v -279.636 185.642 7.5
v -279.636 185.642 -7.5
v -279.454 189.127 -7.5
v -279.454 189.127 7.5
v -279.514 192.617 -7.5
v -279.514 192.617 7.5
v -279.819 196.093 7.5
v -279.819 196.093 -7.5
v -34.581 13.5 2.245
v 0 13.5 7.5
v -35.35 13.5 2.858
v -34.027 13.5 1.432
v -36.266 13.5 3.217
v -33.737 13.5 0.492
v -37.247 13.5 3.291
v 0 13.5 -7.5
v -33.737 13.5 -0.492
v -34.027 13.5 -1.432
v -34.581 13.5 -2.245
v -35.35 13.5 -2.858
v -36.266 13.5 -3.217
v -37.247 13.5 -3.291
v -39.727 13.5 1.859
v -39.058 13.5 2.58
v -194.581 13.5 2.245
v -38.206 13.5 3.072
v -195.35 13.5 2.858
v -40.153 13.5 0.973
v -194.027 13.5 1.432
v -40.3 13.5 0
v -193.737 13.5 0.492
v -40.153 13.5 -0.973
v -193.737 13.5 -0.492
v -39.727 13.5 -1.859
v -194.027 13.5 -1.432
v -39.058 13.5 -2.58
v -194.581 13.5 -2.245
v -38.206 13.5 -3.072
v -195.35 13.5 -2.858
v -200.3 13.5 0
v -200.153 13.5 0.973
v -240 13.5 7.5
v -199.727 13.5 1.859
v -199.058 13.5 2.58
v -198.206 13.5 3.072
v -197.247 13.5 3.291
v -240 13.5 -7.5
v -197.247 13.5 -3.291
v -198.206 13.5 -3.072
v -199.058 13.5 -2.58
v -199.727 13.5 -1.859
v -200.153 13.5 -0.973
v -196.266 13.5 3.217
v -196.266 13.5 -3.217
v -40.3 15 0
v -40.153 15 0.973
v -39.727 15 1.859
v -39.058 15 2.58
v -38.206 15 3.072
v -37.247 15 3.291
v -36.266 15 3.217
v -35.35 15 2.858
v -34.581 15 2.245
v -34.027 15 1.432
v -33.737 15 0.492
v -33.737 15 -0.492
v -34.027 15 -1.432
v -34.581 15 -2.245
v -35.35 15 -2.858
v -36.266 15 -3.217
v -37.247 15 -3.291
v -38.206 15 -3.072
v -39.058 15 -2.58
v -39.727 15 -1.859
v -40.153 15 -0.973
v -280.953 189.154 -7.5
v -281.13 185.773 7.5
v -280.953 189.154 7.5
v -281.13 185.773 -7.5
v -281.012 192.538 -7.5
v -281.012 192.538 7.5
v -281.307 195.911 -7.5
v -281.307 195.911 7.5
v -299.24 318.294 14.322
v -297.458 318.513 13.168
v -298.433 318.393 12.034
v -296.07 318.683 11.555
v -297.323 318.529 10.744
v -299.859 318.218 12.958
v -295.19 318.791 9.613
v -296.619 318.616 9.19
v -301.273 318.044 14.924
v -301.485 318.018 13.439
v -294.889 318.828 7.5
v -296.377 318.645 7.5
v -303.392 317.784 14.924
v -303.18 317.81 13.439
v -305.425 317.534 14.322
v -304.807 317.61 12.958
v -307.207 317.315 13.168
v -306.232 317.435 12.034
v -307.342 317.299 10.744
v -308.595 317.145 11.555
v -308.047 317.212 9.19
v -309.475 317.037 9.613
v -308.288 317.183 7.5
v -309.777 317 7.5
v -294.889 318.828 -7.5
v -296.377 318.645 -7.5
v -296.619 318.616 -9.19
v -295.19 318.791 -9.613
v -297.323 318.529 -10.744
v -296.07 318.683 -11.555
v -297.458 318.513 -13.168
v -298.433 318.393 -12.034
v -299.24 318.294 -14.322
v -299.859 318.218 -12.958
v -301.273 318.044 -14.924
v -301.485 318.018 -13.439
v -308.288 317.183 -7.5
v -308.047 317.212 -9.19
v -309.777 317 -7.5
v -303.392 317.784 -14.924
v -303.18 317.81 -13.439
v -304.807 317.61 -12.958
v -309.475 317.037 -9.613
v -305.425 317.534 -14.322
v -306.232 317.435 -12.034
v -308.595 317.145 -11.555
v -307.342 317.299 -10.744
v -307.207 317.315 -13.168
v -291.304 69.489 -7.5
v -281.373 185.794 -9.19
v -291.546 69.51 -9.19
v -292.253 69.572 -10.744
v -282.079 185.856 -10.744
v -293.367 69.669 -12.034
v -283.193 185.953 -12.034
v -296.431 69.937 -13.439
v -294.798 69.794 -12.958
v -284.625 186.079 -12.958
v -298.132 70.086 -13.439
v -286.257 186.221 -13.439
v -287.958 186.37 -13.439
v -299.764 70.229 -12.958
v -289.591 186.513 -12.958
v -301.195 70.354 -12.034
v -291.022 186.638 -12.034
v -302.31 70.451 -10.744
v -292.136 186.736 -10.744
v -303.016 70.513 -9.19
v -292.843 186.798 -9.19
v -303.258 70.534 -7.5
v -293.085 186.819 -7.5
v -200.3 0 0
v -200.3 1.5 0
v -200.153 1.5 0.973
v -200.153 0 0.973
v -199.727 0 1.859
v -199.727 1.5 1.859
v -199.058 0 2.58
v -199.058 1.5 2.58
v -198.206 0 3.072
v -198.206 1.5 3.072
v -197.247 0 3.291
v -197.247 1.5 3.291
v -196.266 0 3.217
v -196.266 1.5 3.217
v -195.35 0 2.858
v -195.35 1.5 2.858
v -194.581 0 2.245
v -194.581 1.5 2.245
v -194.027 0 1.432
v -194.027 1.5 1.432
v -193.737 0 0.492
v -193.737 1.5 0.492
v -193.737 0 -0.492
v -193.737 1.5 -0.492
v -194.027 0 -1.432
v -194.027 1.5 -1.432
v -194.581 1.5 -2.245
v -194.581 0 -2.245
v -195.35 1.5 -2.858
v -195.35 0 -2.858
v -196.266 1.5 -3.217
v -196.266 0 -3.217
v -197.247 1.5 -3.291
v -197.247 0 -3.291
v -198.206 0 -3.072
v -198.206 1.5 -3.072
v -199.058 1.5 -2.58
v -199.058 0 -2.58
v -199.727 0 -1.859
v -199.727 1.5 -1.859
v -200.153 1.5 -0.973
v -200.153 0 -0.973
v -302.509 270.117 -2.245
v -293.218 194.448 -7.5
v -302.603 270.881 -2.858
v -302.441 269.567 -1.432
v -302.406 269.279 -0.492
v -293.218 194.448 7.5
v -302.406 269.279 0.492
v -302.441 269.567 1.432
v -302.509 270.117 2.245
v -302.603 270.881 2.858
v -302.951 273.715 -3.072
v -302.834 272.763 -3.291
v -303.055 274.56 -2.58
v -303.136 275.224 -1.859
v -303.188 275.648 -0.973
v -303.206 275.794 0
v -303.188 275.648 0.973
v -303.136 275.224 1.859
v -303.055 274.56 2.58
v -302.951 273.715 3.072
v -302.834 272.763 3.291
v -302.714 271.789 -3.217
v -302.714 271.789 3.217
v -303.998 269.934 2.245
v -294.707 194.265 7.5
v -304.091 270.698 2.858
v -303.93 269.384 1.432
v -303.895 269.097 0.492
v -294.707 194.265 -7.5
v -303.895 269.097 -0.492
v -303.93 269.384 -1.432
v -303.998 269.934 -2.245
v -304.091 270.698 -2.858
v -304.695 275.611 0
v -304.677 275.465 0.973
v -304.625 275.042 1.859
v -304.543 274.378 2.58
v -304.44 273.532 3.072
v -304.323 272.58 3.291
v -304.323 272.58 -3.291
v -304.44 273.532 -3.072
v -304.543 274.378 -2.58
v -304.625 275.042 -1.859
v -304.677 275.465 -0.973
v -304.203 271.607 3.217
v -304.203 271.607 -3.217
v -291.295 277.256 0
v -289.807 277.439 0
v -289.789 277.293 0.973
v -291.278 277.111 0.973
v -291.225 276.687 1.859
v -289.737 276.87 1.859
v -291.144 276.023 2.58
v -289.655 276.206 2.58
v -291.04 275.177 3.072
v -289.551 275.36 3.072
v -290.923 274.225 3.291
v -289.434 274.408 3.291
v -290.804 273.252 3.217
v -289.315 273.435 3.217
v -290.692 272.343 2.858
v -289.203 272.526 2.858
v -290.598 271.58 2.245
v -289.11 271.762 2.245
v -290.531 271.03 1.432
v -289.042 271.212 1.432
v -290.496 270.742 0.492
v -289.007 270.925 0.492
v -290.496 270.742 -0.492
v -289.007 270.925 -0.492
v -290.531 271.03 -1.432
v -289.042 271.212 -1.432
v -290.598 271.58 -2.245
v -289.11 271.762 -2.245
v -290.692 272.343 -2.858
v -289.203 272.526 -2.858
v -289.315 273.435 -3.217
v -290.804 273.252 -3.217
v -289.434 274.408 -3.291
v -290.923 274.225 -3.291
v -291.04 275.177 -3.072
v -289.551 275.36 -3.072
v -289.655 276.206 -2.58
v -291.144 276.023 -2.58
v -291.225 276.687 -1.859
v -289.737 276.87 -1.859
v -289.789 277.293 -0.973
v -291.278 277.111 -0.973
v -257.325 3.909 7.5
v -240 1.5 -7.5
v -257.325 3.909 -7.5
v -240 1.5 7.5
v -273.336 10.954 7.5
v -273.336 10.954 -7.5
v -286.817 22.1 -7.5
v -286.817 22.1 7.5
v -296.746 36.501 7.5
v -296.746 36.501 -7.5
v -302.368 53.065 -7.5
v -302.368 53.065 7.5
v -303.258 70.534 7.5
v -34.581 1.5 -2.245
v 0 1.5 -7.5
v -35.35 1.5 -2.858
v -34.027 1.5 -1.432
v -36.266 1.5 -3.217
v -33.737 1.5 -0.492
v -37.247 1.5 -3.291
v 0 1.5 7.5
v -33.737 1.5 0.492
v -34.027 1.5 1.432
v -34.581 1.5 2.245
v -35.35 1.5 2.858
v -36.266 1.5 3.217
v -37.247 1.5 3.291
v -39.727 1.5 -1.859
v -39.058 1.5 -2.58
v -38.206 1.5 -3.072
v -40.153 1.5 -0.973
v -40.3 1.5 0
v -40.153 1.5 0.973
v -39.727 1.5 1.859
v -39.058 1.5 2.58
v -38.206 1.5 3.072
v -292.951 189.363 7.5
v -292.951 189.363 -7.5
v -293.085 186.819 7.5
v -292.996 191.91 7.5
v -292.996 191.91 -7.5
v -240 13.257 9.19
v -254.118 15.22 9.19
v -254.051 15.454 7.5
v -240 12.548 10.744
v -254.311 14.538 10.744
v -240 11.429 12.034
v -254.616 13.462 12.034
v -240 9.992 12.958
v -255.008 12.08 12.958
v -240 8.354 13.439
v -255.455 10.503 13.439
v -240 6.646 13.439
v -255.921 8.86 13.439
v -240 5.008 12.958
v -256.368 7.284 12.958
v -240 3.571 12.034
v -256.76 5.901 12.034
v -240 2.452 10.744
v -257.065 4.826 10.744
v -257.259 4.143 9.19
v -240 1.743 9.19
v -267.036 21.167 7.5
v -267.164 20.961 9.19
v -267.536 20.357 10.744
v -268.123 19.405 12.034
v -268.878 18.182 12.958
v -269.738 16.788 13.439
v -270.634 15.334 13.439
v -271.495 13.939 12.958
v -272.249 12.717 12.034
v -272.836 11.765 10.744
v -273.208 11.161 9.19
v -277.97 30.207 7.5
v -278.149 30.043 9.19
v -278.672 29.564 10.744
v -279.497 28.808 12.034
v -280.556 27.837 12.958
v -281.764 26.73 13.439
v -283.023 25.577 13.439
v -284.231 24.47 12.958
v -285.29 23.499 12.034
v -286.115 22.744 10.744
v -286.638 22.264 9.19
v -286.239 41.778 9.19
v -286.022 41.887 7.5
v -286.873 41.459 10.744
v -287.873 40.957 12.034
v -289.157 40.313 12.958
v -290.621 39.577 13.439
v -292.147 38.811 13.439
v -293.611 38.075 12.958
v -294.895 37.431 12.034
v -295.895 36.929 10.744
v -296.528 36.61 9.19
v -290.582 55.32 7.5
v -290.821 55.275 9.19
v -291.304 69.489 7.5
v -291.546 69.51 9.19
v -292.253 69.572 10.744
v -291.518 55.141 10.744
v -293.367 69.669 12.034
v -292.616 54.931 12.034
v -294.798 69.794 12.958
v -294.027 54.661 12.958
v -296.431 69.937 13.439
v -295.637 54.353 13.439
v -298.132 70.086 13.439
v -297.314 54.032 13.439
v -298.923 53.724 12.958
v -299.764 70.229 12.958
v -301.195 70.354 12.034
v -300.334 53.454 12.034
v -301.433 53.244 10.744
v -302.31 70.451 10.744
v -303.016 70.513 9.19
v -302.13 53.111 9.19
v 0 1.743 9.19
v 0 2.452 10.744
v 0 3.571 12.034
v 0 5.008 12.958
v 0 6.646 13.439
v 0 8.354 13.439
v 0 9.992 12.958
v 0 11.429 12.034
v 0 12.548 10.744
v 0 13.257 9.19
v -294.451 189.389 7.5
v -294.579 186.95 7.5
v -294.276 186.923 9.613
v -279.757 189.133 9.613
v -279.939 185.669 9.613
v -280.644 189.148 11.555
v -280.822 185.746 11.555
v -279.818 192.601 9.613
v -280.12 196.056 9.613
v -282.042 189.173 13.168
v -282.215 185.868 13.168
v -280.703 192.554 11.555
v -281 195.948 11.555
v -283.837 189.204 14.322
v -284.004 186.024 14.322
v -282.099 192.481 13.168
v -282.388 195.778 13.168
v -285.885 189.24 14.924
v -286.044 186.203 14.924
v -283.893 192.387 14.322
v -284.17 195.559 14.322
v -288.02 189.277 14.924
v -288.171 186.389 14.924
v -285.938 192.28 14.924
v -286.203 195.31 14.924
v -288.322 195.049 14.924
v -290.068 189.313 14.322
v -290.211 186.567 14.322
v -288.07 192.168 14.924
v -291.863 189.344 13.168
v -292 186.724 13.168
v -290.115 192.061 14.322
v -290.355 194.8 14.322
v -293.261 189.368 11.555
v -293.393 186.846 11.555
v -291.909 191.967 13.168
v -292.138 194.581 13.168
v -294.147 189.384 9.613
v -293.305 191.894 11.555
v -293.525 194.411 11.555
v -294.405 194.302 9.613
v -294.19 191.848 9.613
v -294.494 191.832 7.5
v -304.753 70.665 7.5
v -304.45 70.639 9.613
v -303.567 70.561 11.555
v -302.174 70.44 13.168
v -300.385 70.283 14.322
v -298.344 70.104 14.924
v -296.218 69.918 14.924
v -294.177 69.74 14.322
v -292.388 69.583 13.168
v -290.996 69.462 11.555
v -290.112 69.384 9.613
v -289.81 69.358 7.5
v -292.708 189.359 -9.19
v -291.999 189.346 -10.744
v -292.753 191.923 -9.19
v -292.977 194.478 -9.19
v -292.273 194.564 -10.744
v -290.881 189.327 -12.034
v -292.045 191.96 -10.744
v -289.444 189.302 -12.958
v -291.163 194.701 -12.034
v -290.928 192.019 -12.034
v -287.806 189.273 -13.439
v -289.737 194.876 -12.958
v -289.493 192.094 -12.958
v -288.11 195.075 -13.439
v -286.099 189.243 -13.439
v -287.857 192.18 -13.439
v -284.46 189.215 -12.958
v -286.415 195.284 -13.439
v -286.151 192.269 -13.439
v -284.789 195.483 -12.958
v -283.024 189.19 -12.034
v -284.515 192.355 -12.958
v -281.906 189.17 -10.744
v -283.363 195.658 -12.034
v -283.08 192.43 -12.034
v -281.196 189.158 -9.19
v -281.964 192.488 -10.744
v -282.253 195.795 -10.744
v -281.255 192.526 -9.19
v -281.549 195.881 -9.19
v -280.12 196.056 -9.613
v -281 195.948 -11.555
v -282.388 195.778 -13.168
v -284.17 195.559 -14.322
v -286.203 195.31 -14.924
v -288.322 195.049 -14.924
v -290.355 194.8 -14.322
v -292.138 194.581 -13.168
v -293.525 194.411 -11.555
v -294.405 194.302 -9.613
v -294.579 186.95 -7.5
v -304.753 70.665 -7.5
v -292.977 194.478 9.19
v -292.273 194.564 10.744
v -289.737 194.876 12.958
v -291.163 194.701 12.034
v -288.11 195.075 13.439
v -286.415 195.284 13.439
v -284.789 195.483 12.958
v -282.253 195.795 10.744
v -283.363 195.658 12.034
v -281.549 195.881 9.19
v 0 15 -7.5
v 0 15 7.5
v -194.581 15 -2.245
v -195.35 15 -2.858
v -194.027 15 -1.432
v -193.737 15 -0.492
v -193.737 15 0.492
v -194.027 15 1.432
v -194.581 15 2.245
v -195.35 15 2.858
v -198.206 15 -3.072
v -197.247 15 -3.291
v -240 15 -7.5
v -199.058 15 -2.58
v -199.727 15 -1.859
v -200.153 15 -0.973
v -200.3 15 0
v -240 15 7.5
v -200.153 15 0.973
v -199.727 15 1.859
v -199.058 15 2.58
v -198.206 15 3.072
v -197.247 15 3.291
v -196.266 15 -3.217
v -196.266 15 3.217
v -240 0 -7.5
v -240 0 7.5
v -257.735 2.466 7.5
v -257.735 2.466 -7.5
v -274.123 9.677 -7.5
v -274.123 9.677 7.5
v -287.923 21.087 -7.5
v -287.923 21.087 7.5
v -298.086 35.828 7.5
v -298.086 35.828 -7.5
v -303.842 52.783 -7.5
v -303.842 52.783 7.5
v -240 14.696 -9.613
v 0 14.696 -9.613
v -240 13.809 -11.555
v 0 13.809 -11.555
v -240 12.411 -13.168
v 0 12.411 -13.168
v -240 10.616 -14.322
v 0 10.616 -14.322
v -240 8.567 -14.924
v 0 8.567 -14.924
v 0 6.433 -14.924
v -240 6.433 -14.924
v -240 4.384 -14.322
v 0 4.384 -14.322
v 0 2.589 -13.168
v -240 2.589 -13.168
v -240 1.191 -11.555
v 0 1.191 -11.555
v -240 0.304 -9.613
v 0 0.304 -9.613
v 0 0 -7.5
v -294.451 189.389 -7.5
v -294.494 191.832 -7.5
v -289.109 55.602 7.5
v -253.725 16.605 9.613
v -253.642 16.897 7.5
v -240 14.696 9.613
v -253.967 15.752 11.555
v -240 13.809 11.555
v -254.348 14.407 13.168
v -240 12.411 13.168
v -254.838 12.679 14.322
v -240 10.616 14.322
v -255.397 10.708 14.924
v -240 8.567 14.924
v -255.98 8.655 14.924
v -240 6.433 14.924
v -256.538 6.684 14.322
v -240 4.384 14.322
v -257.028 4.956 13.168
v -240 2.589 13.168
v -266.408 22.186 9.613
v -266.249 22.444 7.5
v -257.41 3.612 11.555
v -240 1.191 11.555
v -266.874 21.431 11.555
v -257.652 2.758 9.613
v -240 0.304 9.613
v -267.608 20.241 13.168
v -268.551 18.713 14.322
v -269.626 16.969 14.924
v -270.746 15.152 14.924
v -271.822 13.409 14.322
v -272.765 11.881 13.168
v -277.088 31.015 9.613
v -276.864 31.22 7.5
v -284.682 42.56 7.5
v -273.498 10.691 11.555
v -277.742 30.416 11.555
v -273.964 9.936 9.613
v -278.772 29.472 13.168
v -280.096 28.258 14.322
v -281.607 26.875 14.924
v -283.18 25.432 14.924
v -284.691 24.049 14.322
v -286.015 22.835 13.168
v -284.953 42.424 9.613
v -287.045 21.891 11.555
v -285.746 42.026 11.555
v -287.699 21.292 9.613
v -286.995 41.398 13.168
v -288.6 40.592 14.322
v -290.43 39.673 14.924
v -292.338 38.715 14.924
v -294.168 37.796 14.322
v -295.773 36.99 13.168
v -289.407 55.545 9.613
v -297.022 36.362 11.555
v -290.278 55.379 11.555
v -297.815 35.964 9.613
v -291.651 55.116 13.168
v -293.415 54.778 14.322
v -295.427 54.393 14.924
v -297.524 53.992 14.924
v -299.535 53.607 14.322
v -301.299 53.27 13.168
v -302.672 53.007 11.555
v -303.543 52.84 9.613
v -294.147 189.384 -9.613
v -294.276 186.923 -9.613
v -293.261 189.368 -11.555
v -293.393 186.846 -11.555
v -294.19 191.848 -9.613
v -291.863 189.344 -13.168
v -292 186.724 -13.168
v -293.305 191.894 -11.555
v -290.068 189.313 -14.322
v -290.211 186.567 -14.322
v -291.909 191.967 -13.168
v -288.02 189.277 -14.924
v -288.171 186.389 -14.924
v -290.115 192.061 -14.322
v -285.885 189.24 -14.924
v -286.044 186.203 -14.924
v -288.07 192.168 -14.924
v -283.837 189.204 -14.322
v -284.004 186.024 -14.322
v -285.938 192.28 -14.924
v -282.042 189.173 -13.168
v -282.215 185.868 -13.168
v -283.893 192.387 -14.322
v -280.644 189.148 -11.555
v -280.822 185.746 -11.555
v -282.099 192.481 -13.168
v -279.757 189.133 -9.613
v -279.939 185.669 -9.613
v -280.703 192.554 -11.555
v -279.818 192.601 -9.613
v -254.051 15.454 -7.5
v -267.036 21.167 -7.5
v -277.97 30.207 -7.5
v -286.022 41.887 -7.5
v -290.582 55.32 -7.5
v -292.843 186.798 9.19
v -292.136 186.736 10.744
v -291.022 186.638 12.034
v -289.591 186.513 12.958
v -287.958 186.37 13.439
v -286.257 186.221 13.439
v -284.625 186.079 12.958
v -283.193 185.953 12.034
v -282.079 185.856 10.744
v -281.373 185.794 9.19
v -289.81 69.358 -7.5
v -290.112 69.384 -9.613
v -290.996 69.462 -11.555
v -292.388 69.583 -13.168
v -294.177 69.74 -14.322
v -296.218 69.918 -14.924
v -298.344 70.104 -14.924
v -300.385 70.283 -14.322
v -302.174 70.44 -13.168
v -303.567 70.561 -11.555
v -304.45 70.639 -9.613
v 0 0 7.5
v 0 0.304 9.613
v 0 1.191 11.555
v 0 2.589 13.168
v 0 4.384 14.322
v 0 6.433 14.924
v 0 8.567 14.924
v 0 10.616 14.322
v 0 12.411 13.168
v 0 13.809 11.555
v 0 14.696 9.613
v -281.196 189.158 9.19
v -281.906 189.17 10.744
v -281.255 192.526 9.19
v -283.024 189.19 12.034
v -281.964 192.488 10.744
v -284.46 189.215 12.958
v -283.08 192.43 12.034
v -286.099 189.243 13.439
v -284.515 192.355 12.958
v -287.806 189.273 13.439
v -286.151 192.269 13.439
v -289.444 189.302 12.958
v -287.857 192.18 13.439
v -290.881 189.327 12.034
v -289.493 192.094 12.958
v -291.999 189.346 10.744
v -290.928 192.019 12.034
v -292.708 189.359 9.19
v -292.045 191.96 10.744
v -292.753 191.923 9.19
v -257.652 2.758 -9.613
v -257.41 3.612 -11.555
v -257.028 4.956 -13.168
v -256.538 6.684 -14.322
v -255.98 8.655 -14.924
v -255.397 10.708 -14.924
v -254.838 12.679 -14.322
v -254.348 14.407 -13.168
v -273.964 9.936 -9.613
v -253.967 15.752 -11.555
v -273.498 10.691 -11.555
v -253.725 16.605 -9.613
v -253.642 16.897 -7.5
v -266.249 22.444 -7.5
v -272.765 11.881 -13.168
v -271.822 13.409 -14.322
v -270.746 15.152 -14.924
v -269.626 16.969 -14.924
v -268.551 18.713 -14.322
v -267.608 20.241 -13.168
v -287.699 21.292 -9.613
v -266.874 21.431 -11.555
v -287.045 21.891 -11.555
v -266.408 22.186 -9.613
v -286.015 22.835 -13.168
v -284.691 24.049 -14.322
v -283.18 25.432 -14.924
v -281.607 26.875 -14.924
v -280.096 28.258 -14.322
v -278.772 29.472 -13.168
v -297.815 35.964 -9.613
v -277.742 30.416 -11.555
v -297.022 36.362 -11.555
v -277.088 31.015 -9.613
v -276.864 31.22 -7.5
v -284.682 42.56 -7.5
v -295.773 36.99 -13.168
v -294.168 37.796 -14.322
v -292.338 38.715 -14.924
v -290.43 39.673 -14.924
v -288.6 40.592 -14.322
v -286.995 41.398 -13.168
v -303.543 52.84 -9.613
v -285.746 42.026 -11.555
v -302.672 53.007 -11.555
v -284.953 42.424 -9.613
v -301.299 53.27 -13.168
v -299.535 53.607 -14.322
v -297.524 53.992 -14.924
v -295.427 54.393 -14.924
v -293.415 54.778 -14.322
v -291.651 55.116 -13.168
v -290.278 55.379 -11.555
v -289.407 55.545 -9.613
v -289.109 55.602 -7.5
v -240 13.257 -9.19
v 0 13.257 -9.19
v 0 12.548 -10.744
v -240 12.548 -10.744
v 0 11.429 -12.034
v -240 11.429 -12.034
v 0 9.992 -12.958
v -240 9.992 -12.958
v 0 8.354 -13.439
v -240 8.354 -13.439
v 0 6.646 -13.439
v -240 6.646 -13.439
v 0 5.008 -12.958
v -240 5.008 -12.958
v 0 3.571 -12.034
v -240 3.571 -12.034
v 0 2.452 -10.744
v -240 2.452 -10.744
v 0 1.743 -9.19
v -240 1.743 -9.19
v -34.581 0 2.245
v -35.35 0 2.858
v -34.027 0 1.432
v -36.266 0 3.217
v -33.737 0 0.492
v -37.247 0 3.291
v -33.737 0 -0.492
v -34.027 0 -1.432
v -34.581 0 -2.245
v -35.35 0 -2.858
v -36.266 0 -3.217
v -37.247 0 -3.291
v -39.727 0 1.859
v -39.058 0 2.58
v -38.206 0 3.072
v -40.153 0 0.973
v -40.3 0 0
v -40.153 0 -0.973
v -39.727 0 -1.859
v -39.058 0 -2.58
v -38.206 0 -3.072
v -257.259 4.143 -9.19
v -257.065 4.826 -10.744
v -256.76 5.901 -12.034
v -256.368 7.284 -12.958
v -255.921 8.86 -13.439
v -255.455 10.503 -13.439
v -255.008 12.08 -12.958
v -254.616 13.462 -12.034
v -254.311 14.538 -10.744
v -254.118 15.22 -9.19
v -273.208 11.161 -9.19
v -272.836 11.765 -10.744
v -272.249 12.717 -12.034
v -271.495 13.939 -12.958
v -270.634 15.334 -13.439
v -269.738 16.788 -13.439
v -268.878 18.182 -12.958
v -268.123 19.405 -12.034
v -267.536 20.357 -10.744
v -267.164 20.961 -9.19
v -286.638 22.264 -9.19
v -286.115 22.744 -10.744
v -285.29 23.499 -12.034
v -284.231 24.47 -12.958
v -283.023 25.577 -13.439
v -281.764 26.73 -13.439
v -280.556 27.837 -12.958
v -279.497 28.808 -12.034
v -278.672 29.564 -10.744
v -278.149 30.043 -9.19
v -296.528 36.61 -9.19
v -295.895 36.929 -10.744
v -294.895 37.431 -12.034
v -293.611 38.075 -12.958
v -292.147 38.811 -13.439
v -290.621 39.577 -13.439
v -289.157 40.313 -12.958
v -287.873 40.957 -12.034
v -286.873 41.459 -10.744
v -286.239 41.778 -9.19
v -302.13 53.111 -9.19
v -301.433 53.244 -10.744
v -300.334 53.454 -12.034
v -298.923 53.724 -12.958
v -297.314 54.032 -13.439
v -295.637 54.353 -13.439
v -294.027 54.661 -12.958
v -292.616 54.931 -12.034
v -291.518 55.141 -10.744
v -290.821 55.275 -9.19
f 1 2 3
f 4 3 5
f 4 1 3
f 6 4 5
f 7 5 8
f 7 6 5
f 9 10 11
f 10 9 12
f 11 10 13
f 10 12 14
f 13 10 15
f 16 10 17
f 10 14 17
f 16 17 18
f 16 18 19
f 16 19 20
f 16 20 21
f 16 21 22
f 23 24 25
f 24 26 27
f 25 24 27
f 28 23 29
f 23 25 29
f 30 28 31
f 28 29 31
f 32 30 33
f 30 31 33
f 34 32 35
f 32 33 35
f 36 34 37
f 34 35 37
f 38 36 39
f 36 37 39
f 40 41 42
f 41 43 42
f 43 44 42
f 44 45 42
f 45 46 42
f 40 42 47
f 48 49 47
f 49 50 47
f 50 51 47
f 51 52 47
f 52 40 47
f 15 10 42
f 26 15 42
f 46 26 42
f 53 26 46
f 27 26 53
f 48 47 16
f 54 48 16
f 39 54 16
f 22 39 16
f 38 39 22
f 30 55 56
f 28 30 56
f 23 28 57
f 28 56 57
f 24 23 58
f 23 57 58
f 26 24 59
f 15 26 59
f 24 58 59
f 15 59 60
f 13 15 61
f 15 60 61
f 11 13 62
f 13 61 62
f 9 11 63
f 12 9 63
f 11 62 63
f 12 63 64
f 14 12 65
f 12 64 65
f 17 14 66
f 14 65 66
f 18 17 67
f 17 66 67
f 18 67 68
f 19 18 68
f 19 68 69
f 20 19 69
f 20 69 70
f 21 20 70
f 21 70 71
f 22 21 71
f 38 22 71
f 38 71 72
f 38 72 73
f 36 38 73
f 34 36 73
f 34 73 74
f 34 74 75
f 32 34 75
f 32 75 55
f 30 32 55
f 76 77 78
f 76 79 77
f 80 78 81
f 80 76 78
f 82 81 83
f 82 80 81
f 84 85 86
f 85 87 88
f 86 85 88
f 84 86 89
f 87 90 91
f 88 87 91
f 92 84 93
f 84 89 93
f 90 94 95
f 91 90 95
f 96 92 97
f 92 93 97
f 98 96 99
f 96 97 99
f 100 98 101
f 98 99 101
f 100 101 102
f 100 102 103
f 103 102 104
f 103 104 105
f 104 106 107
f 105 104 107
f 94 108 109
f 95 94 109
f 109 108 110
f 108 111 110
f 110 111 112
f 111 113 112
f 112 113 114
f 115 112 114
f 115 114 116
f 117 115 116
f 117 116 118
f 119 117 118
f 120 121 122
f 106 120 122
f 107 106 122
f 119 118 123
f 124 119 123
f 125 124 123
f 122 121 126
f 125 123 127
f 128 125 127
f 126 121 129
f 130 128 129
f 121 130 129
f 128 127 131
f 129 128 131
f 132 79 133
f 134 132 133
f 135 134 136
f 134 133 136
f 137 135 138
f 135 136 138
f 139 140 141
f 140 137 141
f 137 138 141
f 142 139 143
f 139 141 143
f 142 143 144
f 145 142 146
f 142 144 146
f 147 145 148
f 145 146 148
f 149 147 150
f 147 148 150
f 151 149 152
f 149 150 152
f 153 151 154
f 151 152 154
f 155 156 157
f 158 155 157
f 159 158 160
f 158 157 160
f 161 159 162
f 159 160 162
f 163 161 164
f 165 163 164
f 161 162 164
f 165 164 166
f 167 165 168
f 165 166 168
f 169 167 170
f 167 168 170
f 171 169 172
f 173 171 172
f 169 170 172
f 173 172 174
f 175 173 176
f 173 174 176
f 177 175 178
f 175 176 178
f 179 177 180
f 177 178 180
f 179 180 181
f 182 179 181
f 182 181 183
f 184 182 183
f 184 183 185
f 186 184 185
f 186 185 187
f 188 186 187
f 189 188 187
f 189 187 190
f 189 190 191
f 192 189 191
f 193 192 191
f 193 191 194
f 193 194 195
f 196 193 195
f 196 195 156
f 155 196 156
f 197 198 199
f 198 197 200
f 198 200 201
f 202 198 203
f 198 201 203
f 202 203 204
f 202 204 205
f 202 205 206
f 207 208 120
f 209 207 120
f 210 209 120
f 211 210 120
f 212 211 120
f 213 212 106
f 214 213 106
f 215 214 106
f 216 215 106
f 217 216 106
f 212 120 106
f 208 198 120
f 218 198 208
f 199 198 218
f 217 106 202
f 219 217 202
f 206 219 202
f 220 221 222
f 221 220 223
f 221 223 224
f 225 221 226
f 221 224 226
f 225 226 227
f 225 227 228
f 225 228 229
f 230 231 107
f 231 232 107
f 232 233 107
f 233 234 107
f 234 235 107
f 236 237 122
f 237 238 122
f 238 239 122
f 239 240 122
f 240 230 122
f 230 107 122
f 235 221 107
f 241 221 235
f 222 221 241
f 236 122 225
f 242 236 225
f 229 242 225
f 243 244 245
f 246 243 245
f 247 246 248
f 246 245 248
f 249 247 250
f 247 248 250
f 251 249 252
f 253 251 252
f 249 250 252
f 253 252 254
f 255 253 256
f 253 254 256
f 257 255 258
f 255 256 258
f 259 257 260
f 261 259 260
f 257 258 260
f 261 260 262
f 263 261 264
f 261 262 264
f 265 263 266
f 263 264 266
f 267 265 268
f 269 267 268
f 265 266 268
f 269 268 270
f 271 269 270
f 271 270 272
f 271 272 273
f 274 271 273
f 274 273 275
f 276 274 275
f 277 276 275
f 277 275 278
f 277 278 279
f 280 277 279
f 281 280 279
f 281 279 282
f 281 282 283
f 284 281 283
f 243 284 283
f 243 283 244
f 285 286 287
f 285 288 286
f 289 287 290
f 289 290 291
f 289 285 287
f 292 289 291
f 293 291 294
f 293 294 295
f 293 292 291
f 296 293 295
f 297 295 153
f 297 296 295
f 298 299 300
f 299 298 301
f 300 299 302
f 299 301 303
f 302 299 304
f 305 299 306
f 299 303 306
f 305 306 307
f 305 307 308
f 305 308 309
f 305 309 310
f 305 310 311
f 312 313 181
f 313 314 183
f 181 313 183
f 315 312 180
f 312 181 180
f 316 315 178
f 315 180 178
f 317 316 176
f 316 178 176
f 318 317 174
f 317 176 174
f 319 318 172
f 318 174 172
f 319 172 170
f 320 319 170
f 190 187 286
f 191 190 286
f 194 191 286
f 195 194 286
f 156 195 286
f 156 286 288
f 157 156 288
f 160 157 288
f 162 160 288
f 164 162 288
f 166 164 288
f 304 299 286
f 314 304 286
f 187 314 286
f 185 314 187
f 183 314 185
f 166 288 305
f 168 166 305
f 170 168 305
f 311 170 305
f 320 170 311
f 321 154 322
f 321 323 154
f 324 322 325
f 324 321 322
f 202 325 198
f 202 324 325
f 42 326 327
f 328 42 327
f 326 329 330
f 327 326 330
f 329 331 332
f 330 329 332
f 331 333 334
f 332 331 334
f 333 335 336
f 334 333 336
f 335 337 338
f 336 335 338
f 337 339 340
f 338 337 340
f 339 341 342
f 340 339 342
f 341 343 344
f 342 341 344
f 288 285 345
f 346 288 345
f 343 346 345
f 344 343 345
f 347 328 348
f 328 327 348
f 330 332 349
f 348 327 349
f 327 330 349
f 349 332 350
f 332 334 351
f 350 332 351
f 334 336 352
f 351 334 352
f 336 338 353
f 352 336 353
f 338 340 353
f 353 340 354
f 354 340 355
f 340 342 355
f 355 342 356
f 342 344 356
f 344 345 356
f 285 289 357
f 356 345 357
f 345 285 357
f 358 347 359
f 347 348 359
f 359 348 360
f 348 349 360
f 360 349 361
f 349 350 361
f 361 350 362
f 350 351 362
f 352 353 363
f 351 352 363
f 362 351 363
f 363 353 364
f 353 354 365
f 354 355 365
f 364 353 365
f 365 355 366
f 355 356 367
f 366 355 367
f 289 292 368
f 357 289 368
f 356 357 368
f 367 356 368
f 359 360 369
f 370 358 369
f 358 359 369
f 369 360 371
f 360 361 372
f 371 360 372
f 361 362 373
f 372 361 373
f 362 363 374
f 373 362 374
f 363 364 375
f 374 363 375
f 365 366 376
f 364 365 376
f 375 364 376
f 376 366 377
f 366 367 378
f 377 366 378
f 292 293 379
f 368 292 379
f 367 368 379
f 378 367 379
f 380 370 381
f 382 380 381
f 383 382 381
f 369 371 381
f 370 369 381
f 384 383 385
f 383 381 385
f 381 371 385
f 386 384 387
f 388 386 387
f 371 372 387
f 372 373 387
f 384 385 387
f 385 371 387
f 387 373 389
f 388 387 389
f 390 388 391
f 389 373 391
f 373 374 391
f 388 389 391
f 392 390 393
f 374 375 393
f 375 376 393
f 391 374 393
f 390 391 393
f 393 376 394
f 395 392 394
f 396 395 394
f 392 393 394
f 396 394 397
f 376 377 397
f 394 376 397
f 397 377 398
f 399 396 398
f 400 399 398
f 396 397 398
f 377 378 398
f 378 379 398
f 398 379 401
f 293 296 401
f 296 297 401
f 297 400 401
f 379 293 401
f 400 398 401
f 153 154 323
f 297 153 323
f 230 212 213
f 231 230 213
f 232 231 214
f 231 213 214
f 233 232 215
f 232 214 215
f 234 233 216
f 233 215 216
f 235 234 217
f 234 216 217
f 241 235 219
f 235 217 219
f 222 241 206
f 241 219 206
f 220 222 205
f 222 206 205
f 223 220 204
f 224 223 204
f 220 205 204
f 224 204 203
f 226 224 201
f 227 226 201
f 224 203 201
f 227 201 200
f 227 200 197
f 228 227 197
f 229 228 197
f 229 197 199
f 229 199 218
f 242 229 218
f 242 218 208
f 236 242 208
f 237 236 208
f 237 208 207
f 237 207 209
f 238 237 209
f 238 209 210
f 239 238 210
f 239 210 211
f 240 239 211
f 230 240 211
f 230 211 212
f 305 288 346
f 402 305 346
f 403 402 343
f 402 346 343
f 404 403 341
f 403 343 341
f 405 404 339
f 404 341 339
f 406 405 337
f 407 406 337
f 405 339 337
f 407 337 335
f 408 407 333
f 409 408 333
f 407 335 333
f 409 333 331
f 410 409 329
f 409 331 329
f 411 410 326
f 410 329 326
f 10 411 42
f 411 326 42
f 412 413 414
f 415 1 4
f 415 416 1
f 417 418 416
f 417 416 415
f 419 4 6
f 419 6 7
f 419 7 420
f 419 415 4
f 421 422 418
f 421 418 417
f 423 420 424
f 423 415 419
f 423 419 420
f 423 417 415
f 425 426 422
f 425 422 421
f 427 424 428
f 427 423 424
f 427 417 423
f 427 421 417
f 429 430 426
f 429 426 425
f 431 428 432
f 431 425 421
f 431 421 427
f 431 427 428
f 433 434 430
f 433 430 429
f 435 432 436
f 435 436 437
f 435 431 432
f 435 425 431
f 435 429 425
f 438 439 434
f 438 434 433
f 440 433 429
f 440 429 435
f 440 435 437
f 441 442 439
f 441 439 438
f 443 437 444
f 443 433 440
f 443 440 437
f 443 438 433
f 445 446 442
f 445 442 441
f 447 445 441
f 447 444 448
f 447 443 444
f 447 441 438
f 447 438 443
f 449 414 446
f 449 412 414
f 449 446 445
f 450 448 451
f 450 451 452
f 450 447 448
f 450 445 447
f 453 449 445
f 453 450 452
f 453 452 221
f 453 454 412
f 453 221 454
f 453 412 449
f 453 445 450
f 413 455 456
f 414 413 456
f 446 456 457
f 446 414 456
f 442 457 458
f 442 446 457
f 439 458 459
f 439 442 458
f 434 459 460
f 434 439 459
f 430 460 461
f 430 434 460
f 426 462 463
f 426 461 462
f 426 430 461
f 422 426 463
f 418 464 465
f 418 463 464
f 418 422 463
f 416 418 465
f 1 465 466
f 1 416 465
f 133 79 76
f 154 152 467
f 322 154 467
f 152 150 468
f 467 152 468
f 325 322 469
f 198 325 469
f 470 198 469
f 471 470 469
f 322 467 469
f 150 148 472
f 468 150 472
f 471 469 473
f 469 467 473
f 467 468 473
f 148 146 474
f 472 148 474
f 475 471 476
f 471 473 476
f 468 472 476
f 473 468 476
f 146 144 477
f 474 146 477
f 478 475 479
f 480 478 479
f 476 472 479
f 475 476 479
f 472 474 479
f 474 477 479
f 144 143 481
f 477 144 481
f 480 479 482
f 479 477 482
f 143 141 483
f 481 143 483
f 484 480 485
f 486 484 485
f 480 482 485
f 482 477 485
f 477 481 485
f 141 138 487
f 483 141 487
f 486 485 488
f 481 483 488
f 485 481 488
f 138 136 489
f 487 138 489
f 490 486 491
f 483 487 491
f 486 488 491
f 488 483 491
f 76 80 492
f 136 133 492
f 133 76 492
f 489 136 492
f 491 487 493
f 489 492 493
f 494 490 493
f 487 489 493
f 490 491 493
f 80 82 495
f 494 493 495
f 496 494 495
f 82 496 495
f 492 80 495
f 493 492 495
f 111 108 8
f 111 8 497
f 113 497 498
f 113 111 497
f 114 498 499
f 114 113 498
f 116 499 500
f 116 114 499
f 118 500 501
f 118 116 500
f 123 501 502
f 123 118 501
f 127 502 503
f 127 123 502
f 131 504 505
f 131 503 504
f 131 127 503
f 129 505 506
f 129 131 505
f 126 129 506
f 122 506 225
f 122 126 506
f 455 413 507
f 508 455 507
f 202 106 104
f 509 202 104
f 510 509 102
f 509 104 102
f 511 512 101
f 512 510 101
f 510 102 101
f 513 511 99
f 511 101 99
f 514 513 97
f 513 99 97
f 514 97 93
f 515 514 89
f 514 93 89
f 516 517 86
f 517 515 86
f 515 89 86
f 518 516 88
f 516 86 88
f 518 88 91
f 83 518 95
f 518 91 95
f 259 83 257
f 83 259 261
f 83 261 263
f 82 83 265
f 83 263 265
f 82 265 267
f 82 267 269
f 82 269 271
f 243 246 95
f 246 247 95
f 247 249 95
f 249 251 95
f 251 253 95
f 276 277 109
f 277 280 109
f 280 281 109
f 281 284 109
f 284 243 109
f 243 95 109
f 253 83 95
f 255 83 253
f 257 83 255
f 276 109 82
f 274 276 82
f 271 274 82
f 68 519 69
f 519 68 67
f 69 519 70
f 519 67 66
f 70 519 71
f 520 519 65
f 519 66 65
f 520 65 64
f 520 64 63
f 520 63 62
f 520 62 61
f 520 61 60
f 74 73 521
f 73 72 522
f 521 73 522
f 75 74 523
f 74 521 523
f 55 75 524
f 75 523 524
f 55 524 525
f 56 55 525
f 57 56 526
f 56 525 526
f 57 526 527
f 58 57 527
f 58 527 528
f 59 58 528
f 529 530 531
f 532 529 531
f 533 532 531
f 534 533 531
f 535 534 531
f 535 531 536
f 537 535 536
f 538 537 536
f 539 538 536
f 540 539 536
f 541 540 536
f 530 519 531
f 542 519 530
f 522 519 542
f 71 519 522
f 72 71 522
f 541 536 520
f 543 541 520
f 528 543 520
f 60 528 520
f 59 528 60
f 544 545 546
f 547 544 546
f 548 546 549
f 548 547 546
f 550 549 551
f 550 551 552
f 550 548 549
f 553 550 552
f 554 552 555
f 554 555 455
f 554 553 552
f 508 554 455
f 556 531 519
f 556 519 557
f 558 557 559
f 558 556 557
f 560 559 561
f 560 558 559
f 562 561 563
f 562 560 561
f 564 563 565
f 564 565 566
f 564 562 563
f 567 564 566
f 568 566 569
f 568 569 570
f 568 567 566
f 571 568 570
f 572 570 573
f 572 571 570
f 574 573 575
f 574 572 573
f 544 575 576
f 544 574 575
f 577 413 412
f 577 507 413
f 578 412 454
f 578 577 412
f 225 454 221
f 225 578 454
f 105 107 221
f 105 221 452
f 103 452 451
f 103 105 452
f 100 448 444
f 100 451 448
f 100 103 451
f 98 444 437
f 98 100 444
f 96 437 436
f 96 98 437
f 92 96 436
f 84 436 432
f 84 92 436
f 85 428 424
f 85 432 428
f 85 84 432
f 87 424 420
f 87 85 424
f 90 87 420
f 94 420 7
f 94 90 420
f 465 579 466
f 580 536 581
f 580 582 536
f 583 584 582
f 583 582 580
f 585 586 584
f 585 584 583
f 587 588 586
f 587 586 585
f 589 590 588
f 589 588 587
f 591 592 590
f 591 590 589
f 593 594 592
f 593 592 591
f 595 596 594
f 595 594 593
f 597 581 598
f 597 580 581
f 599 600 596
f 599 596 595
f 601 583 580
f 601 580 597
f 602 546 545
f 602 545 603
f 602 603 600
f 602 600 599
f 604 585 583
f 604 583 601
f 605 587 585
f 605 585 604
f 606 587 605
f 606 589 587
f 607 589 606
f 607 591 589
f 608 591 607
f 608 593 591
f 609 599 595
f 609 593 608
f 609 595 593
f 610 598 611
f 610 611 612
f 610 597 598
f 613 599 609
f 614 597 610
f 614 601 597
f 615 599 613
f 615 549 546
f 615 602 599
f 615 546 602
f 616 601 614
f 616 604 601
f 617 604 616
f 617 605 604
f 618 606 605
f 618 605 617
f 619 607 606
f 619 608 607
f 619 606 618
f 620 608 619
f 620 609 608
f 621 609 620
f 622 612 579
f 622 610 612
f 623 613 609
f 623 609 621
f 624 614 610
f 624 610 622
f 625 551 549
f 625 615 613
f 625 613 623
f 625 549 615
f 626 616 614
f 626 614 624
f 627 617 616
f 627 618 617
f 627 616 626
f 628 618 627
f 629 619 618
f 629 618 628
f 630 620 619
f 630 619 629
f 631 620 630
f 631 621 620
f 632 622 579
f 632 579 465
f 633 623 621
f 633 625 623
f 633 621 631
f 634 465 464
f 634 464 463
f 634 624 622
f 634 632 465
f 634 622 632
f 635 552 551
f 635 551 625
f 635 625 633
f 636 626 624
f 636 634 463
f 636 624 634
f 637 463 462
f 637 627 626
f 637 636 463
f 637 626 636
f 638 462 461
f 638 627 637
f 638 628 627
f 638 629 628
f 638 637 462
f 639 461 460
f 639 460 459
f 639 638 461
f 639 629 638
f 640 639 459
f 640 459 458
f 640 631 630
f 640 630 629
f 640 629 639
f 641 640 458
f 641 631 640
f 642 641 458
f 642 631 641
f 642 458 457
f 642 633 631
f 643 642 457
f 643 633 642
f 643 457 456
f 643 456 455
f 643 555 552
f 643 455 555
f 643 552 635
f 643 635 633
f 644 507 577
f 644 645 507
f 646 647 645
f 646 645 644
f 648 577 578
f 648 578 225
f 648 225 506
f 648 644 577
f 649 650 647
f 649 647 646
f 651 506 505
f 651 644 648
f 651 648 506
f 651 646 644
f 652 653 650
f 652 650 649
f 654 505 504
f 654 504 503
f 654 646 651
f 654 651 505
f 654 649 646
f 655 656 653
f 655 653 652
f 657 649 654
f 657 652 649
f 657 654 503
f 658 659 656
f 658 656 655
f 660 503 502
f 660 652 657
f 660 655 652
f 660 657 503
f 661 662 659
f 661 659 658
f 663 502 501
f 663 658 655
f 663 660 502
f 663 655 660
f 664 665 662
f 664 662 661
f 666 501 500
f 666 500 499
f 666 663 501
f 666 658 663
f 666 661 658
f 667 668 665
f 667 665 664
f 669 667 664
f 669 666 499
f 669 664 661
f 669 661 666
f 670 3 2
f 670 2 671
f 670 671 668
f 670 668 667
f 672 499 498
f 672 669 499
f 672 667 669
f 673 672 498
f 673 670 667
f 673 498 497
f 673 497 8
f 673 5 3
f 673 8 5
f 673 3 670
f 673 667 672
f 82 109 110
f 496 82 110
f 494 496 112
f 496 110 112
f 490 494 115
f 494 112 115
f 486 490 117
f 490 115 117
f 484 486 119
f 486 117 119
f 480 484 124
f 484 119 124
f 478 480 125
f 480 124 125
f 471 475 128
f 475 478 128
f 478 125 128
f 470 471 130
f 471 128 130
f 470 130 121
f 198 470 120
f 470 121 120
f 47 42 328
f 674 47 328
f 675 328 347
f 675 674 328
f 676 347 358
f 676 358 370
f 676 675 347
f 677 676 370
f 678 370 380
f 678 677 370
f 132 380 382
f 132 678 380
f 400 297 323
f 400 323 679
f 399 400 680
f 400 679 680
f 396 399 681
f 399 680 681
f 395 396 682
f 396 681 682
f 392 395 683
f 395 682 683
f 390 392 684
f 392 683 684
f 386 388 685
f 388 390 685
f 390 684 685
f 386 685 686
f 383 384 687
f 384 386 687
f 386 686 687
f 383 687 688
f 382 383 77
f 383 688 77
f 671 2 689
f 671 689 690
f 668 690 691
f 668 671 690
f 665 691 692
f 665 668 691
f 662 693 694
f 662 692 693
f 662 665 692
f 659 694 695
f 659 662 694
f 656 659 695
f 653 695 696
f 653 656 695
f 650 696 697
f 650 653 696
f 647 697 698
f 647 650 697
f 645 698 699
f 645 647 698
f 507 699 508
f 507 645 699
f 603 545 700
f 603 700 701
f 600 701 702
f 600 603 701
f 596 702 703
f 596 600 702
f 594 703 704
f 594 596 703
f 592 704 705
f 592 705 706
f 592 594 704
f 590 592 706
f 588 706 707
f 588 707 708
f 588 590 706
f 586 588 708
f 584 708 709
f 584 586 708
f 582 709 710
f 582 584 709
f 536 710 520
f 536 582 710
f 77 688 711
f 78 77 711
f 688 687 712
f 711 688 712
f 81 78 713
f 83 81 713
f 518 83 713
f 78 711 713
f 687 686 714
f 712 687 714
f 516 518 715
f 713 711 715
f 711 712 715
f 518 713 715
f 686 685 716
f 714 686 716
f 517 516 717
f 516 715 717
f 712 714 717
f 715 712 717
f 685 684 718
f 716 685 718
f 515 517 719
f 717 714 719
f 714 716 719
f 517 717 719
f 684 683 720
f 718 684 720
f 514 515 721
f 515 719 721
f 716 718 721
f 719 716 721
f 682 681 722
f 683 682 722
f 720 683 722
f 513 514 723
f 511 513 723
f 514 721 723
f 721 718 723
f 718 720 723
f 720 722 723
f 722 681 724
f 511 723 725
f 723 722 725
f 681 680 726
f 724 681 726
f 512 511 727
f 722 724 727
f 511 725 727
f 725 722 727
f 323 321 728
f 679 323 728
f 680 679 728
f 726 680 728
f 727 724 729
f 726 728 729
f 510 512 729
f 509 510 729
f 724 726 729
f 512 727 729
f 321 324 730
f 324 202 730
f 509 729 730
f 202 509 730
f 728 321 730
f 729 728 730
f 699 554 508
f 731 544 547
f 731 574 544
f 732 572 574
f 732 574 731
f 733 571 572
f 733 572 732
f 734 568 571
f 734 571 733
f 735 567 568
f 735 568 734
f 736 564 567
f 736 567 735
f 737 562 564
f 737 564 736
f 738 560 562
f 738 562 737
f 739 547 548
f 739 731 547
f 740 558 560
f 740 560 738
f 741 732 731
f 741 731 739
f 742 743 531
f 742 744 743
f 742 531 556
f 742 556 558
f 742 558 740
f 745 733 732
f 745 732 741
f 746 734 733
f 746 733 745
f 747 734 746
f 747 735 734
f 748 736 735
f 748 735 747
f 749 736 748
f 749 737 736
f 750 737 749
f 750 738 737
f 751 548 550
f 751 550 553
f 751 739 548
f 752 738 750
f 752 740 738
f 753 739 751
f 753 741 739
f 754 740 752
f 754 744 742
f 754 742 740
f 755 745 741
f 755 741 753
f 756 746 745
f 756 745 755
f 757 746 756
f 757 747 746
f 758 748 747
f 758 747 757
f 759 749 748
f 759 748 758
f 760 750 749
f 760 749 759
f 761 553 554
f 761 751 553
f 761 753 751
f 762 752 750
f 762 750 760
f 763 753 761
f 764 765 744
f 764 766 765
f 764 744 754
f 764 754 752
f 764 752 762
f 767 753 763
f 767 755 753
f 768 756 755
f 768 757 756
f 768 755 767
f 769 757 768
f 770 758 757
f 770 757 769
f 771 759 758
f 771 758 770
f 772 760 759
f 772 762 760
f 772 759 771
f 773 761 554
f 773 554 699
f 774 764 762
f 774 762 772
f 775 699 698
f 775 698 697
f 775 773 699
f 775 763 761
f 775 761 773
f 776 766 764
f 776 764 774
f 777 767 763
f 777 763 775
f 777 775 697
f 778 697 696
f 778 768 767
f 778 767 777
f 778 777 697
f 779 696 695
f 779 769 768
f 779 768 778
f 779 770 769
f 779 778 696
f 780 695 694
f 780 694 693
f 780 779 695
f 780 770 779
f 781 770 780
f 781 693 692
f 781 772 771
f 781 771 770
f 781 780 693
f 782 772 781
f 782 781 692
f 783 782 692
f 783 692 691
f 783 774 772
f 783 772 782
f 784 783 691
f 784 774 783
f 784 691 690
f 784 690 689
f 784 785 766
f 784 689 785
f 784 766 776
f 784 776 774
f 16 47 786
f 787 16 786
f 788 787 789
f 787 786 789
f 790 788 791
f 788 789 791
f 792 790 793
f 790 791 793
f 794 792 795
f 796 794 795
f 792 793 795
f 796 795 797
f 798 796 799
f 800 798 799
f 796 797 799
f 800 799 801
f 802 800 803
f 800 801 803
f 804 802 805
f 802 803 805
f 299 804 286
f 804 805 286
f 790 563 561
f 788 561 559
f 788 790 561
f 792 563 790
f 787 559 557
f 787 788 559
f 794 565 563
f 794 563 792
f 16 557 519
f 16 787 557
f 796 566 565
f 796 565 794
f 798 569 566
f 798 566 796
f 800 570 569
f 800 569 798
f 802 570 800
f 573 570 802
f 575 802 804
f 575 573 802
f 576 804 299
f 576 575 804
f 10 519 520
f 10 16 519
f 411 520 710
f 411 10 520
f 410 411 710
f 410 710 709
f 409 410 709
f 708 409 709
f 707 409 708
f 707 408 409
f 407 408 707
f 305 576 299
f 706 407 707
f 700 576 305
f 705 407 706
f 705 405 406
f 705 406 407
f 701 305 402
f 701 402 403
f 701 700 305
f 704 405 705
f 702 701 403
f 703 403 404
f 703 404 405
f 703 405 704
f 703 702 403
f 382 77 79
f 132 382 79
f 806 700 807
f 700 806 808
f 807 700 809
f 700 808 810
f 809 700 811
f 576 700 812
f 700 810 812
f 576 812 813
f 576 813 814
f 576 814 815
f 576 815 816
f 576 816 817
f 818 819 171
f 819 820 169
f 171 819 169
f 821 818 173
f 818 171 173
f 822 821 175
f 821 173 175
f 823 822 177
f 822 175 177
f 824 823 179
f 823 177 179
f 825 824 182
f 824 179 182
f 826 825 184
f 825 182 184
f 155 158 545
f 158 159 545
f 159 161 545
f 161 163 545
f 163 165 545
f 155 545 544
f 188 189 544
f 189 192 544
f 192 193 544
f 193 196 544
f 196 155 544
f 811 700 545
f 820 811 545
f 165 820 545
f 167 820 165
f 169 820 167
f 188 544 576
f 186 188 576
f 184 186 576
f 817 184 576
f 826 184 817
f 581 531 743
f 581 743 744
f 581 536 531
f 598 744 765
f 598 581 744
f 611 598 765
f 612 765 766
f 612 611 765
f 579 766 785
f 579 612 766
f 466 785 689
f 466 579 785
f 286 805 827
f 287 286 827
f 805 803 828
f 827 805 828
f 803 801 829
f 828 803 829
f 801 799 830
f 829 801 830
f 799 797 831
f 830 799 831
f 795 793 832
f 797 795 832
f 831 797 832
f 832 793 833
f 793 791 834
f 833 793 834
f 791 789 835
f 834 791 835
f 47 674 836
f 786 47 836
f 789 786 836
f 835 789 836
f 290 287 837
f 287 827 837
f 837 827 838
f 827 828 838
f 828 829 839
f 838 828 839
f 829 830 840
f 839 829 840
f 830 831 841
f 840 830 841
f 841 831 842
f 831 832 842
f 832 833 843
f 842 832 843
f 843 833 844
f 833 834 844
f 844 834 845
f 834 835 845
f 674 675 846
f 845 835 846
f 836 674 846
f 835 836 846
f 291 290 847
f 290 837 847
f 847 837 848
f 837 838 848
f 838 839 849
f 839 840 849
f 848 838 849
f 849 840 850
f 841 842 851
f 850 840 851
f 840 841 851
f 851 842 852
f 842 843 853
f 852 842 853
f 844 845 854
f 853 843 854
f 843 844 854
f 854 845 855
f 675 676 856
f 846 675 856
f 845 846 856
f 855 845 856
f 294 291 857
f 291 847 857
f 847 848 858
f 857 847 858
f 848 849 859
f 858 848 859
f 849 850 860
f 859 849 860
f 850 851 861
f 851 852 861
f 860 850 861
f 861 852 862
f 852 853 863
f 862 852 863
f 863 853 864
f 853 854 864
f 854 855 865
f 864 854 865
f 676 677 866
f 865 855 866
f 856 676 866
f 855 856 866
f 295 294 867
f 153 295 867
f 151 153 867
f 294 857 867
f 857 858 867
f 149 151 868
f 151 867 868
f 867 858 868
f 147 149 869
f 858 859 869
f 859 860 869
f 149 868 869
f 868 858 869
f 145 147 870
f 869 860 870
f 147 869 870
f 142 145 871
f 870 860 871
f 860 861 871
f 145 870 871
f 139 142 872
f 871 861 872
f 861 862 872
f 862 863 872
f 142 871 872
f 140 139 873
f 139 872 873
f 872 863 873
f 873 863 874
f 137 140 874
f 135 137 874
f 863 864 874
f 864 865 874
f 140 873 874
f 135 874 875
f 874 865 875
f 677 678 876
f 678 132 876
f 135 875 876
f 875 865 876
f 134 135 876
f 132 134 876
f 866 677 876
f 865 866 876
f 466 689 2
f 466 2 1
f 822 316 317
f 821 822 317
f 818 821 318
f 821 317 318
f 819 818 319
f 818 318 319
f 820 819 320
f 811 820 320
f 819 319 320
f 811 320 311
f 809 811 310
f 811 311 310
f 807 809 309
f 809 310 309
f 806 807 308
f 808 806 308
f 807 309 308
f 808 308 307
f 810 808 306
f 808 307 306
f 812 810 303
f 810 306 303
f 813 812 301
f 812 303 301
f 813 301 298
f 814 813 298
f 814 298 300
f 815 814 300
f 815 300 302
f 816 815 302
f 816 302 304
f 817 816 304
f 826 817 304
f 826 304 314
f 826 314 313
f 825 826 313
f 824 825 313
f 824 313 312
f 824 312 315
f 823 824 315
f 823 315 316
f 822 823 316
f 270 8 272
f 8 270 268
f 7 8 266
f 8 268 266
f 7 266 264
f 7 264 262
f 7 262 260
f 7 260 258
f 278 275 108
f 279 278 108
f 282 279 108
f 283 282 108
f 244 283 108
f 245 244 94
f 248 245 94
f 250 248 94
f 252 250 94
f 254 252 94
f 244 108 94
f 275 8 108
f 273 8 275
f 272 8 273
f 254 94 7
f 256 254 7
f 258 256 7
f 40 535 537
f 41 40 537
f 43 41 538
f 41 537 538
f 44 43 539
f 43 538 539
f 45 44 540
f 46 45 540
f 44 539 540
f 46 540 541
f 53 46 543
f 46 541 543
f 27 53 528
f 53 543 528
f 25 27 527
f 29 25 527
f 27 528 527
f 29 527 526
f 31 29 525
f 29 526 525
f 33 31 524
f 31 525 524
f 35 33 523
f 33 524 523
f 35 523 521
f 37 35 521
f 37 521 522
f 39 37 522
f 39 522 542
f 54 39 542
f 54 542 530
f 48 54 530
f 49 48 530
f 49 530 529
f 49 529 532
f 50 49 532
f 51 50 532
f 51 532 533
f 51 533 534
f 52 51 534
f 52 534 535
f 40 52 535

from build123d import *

# Parameters (mm, degrees)
SKETCH_3_R          = 3.3
CUT_EXTRUDE_1_DEPTH = 435.163655166
SKETCH_4_R          = 3.3
CUT_EXTRUDE_2_DEPTH = 432.316912752


with BuildPart() as part:
    # По траектории1: sweep along a path in Эскиз1
    with BuildLine(Plane.XY) as sweep_1_path:
        Line((0, 0), (-240, 0))
        ThreePointArc((-240, 0), (-287.923026893, 21.086636505), (-304.752655376, 70.665123279))
        Line((-304.752655376, 70.665123279), (-294.57908638, 186.949549004))
        ThreePointArc((-294.57908638, 186.949549004), (-294.451231483, 190.610834225), (-294.706785506, 194.265427019))
        Line((-294.706785506, 194.265427019), (-309.776696157, 317))
    # Эскиз2 → По траектории1 (sweep)
    with BuildSketch(Plane(origin=(0, 0, 0), x_dir=(0, 0, -1), z_dir=(1, 0, 0))):
        with BuildLine():
            Line((-7.5, 15), (7.5, 15))
            ThreePointArc((7.5, 15), (15, 7.5), (7.5, 0))
            Line((7.5, 0), (-7.5, 0))
            ThreePointArc((-7.5, 0), (-15, 7.5), (-7.5, 15))
        make_face()
        with BuildLine():
            Line((-7.5, 13.5), (7.5, 13.5))
            ThreePointArc((7.5, 13.5), (13.5, 7.5), (7.5, 1.5))
            Line((7.5, 1.5), (-7.5, 1.5))
            ThreePointArc((-7.5, 1.5), (-13.5, 7.5), (-7.5, 13.5))
        make_face(mode=Mode.SUBTRACT)
    sweep(path=sweep_1_path.line)

    # Эскиз3 → Вырез-Вытянуть1 (cut, through all)
    with BuildSketch(Plane(origin=(0, 15, 0), x_dir=(1, 0, 0), z_dir=(0, 1, 0))):
        with Locations(Location((-197, 0, 0), (0, 0, 180))):
            Circle(SKETCH_3_R)
        with Locations(Location((-37, 0, 0), (0, 0, 180))):
            Circle(SKETCH_3_R)
    extrude(amount=-CUT_EXTRUDE_1_DEPTH, mode=Mode.SUBTRACT)

    # Эскиз4 → Вырез-Вытянуть2 (cut, through all)
    with BuildSketch(Plane(origin=(-251.943037542, -30.934715237, 0), x_dir=(0, 0, -1), z_dir=(0.9925461516413225, 0.12186934340514467, 0))):
        with Locations(Location((0, 307.389412633, 0), (0, 0, 90))):
            Circle(SKETCH_4_R)
    extrude(amount=-CUT_EXTRUDE_2_DEPTH, mode=Mode.SUBTRACT)


solid = part.part
